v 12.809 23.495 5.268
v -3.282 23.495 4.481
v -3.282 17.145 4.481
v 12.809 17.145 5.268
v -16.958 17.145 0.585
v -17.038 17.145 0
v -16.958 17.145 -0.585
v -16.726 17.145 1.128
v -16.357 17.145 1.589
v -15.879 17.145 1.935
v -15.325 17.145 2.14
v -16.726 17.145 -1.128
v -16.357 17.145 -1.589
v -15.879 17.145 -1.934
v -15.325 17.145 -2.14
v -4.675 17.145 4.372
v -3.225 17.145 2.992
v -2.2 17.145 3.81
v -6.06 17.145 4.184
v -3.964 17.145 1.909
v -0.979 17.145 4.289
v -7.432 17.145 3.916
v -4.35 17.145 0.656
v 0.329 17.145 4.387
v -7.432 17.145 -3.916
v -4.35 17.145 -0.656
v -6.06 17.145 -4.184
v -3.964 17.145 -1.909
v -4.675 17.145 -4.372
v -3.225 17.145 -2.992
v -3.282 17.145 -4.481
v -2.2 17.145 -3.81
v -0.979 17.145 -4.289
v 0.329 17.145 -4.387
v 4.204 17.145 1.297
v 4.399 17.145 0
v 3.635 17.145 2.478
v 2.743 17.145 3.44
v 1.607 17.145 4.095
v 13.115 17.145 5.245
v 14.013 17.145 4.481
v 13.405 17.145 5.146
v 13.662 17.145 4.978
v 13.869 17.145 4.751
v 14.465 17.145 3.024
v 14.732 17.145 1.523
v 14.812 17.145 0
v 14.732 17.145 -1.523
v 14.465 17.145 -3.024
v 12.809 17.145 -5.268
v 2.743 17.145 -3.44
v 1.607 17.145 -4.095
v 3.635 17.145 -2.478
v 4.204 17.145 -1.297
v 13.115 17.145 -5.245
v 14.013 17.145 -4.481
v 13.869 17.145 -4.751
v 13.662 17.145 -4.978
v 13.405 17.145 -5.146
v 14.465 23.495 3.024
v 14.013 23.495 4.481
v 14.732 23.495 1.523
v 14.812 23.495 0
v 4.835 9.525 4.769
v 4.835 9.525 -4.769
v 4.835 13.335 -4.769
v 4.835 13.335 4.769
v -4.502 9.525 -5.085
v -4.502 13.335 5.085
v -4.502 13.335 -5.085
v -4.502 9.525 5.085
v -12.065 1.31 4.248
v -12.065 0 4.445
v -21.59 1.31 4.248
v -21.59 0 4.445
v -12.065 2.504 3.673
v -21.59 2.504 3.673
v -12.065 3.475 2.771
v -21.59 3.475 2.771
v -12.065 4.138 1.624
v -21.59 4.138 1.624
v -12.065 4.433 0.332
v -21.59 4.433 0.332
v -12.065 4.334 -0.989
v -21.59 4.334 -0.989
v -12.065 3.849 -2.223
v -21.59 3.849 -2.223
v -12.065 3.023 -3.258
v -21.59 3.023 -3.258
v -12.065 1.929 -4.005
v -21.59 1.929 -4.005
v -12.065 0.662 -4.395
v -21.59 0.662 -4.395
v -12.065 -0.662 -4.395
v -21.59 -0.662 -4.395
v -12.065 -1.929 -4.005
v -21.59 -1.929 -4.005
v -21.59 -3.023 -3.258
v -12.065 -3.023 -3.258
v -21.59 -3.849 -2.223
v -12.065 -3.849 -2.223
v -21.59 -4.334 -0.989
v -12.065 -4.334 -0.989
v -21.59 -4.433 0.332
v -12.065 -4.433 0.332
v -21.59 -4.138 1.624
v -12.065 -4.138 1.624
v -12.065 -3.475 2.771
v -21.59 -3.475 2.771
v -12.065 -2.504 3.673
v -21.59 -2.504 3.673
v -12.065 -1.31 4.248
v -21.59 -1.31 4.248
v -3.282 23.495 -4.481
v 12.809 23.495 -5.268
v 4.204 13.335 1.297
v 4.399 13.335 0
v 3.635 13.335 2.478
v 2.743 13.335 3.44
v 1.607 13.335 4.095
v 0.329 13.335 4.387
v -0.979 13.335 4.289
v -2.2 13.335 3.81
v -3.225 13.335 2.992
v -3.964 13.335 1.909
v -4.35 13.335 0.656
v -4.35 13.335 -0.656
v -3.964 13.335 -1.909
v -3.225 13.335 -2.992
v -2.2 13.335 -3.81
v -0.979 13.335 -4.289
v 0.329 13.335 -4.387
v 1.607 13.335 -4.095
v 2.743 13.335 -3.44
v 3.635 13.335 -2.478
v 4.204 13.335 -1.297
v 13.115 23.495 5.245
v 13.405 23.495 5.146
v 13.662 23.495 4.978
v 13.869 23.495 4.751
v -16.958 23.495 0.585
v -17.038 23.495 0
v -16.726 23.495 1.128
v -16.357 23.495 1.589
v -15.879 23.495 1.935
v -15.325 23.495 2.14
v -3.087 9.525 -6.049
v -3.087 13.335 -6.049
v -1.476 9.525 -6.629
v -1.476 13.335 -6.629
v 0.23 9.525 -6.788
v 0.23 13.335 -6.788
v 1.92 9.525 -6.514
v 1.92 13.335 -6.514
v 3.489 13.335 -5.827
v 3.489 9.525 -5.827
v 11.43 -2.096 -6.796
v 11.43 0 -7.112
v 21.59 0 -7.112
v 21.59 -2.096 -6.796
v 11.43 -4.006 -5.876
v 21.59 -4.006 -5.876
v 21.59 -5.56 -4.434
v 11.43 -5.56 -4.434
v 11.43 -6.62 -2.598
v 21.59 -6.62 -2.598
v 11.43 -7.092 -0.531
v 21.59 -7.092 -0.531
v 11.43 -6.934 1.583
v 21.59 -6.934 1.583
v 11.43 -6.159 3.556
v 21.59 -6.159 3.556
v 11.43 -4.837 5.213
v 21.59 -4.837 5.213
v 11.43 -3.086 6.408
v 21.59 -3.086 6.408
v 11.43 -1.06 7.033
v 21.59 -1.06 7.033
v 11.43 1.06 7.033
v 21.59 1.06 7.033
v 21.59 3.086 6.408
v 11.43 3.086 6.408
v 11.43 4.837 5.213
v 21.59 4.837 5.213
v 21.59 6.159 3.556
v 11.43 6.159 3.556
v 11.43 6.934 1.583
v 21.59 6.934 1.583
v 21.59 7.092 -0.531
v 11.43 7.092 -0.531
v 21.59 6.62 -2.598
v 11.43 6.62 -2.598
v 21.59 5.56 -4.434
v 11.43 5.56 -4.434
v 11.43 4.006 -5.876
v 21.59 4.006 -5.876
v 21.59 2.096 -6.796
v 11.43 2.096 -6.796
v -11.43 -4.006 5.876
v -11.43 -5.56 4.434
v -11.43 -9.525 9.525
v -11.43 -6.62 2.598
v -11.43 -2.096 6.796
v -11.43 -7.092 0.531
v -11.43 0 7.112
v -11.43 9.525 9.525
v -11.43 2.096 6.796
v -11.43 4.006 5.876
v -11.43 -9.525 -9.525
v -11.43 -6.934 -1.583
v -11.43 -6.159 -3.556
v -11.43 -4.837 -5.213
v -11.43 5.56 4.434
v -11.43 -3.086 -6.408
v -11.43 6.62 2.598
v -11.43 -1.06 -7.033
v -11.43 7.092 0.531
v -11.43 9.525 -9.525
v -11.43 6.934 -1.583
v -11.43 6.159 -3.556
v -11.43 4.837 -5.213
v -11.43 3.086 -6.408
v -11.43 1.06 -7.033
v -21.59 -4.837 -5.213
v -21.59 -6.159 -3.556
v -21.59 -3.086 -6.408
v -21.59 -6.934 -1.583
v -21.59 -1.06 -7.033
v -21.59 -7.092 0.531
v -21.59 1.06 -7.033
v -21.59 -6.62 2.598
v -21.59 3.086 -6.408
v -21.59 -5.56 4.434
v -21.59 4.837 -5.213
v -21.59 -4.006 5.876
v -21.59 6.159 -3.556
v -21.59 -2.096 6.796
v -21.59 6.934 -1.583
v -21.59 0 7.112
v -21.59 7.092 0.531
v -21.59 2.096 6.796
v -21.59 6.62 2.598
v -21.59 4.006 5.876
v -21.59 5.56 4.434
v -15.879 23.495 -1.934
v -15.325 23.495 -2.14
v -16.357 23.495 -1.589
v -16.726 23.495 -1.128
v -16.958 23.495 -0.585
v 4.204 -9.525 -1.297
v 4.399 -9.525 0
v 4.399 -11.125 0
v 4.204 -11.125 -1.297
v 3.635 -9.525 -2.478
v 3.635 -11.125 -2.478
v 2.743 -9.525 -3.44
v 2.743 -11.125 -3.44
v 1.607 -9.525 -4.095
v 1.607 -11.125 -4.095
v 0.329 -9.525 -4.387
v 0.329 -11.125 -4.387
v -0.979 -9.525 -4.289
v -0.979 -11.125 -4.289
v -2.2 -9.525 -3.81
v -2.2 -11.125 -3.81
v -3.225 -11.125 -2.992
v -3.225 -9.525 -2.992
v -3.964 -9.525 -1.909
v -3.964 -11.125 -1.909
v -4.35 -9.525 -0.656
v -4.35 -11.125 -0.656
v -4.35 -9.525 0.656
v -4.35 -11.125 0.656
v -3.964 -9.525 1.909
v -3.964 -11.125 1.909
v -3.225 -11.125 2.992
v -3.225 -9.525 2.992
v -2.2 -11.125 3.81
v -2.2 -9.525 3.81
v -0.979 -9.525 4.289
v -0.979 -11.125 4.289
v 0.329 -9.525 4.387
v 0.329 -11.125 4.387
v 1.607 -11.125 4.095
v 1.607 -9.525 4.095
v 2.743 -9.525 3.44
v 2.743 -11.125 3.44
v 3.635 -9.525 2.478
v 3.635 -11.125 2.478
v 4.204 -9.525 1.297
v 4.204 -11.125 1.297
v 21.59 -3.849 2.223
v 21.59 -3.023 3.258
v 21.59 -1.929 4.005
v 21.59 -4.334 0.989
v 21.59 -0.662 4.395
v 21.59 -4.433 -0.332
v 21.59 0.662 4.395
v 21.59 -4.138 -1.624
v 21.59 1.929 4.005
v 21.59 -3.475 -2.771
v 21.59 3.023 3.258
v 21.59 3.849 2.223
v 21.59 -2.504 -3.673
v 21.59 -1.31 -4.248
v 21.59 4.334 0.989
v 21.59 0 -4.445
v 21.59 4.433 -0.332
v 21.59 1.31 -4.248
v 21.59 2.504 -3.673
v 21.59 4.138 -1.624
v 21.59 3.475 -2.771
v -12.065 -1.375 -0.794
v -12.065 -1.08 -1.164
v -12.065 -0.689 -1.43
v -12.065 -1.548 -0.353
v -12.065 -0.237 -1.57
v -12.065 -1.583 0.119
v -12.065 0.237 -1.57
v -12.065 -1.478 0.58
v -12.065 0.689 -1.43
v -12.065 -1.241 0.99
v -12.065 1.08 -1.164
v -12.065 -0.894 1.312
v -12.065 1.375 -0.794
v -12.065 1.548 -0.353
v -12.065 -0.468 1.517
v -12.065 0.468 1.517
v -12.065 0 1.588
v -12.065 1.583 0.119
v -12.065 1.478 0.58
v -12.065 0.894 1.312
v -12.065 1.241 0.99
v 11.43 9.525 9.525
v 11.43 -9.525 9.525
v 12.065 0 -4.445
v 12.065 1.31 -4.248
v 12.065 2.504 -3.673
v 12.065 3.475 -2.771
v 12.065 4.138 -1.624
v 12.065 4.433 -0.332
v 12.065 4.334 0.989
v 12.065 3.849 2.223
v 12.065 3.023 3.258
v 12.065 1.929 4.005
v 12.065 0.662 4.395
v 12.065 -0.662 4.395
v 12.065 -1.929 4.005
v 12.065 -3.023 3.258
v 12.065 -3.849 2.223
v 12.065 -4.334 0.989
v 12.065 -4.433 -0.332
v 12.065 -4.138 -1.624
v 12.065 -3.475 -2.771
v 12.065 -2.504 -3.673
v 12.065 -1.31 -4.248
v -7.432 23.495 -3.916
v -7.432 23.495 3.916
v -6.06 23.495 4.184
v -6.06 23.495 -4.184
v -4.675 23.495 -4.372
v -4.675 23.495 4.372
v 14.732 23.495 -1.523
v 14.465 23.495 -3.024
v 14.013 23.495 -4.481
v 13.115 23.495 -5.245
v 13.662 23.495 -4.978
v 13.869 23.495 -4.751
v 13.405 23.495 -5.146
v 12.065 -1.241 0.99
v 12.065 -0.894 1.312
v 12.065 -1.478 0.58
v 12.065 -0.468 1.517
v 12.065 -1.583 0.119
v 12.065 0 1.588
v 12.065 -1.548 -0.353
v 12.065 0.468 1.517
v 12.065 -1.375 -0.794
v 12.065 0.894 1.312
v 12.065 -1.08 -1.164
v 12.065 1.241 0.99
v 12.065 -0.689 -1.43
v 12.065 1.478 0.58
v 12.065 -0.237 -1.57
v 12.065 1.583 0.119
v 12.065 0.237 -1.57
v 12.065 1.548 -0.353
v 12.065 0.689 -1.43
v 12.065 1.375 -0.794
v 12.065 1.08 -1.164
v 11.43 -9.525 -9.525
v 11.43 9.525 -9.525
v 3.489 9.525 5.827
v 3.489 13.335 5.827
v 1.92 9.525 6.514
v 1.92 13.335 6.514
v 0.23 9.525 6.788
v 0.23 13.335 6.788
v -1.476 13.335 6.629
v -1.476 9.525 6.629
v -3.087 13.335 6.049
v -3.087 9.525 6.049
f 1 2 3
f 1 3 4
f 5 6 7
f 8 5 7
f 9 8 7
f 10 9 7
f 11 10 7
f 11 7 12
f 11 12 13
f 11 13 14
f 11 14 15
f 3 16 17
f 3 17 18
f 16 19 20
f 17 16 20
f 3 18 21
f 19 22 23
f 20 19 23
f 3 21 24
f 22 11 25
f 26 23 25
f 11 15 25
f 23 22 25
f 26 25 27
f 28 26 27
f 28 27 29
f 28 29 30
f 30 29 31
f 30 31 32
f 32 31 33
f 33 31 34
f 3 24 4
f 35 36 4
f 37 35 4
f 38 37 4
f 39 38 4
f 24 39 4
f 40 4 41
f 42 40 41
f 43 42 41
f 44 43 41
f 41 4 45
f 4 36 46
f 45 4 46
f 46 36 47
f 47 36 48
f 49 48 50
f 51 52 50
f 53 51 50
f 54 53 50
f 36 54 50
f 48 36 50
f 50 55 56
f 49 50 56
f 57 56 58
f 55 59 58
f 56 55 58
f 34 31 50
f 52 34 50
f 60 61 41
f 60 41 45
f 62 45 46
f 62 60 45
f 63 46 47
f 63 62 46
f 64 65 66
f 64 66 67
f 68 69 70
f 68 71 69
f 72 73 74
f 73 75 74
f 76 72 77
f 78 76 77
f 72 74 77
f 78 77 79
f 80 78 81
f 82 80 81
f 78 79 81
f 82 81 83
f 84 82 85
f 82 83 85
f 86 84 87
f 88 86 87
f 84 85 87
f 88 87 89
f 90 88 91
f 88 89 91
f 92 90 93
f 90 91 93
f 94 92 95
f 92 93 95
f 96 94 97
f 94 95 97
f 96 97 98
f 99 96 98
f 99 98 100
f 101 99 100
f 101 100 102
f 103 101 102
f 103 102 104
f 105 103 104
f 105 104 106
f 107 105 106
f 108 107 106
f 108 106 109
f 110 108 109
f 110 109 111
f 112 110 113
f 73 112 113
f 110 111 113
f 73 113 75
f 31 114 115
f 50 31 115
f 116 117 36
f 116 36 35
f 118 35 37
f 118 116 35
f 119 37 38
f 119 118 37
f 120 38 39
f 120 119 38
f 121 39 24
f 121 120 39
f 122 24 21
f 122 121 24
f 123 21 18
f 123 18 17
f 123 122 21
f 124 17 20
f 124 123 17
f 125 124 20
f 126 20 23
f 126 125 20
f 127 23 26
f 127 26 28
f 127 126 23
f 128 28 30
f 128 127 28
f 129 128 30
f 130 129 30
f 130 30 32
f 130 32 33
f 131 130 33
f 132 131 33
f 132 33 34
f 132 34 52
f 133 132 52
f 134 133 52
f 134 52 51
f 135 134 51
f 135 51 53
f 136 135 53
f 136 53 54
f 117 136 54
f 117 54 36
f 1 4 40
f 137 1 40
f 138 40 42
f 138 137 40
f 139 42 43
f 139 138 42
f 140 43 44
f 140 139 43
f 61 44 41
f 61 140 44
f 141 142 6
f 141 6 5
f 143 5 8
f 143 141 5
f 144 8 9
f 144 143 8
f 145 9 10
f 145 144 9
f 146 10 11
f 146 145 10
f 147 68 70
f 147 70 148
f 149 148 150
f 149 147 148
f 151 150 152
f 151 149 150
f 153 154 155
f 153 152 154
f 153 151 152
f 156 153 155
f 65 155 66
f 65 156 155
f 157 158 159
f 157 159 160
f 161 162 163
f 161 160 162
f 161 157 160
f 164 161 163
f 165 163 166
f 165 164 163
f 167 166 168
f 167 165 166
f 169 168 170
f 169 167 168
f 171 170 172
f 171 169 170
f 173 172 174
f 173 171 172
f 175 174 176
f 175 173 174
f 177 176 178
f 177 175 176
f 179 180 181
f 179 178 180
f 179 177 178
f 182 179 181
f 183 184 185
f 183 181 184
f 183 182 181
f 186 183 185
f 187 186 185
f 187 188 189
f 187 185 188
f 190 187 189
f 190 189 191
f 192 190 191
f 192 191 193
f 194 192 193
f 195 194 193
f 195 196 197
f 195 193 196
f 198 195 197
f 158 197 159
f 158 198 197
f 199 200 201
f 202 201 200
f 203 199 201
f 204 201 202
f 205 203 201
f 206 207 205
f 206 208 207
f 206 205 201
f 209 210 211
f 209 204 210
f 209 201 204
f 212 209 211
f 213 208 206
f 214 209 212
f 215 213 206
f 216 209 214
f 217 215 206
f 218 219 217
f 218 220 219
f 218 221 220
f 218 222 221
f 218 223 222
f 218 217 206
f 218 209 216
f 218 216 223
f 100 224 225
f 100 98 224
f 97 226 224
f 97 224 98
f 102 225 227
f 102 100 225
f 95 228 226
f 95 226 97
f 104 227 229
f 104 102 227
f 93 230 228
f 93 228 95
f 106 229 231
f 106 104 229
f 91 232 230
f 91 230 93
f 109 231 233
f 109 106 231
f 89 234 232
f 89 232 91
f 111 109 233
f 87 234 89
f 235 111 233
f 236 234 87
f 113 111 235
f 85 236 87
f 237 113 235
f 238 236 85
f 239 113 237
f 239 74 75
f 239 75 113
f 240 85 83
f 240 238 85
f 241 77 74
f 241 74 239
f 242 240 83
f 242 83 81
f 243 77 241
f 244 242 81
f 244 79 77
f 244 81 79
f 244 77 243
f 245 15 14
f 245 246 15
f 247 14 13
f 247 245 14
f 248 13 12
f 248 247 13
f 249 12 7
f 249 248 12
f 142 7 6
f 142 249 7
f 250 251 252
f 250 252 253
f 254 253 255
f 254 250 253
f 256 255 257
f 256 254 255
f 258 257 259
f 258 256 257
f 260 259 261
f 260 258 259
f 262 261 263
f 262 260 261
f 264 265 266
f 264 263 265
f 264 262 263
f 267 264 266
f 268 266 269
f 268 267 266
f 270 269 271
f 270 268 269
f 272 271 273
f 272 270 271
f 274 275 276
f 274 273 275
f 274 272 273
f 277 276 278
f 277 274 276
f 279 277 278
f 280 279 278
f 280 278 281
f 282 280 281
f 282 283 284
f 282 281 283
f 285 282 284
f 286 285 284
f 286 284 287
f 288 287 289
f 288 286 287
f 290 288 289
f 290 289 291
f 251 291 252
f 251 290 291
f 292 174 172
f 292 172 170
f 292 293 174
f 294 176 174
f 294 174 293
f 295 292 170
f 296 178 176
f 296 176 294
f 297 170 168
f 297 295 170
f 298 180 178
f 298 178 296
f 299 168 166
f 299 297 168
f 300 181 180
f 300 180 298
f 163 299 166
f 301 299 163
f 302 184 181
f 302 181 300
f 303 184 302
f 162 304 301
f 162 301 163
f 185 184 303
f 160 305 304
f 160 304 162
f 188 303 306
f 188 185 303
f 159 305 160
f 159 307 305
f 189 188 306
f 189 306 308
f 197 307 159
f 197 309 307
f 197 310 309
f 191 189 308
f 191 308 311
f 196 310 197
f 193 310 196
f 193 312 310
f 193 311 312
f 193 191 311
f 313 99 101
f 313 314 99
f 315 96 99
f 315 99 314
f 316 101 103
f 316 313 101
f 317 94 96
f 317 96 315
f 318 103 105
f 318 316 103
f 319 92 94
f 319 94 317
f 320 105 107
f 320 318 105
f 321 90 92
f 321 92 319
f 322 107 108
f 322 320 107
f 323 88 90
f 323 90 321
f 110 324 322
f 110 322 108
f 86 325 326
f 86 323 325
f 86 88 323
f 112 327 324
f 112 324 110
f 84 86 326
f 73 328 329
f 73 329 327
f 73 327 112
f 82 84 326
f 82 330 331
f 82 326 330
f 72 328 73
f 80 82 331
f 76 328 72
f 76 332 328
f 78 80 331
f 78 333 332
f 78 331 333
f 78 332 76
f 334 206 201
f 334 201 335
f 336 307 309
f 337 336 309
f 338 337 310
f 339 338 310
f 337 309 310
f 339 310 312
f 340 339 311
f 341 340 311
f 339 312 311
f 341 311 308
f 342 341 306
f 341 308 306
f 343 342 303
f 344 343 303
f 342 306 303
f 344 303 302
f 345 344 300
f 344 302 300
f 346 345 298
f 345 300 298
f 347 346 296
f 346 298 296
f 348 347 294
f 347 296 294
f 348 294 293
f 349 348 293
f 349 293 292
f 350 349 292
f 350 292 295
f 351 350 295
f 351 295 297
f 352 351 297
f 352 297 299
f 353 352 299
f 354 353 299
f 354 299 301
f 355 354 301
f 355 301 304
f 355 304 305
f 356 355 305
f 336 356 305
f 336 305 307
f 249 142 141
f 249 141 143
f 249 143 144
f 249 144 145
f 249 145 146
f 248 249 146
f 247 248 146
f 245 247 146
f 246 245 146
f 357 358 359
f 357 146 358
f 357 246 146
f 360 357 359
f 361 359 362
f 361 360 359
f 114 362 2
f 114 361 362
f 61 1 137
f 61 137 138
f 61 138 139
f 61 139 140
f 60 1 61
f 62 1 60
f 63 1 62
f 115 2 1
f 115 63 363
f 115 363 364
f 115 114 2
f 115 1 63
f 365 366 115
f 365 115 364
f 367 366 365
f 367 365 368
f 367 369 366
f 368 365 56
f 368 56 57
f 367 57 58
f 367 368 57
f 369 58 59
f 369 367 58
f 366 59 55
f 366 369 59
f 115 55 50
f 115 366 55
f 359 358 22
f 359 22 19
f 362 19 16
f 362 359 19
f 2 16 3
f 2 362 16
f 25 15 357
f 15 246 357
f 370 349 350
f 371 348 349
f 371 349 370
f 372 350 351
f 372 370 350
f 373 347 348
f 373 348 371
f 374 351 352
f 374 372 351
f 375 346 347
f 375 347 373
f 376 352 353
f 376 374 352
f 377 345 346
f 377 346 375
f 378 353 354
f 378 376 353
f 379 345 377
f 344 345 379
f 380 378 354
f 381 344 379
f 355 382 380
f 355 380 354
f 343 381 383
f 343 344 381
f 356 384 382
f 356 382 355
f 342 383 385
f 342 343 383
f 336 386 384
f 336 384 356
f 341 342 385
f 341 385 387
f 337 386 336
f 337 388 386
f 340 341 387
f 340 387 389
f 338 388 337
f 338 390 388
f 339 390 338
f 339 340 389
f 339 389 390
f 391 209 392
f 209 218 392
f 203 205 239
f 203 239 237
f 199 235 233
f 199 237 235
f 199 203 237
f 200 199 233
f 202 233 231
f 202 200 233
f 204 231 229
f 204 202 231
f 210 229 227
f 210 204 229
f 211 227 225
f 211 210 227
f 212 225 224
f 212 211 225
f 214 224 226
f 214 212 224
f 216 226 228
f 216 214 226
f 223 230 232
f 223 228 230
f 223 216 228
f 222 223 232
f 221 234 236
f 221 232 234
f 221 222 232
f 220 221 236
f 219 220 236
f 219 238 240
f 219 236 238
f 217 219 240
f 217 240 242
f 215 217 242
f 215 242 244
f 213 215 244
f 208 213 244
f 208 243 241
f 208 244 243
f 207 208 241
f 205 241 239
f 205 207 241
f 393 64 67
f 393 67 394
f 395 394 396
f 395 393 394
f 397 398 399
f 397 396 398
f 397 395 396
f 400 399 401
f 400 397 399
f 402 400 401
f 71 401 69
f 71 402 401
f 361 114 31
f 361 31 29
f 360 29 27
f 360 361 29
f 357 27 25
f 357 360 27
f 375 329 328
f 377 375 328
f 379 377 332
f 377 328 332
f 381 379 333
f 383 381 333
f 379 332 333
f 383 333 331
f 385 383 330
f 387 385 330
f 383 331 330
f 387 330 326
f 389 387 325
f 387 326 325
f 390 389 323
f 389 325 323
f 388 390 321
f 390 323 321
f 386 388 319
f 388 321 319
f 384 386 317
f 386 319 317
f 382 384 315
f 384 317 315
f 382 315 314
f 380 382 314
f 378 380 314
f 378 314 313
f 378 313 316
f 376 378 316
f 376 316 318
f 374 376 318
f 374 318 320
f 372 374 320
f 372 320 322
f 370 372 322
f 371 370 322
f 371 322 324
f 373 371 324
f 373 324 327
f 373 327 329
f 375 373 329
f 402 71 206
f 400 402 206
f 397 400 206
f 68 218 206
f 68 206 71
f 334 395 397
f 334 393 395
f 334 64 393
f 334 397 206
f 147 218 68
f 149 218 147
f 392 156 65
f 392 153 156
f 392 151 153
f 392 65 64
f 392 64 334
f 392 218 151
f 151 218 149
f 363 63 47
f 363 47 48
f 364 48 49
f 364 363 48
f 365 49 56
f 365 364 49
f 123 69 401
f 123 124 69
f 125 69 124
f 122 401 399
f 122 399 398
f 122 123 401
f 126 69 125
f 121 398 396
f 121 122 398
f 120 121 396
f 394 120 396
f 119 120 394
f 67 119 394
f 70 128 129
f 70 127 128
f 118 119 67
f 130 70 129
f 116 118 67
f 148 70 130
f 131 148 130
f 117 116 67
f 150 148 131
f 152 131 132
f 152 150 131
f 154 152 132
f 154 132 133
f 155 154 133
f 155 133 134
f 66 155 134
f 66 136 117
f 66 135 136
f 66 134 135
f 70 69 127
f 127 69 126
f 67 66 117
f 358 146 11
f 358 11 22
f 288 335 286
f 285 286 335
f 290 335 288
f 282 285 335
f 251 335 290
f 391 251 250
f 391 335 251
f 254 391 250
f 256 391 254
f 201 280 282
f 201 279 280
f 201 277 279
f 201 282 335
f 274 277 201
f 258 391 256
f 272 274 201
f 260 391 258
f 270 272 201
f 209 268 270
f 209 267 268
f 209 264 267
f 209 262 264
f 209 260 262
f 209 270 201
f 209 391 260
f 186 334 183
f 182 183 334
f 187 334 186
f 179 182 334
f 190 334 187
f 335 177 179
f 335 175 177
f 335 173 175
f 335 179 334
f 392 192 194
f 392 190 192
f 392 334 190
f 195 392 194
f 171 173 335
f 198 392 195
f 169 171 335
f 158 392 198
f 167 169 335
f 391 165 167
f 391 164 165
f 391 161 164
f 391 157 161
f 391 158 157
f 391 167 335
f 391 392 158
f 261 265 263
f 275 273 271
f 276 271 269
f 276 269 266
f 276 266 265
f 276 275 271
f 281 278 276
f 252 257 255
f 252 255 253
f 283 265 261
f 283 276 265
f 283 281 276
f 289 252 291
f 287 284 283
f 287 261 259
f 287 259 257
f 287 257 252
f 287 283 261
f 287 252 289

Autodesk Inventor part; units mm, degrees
ref_plane "YZ Plane" through (0, 0, 0) normal (1, 0, 0) x (0, 1, 0)
ref_plane "XZ Plane" through (0, 0, 0) normal (0, 1, 0) x (-1, 0, 0)
ref_plane "XY Plane" through (0, 0, 0) normal (0, 0, 1) x (1, 0, 0)
sketch "Sketch1" plane through (0, 0, 0) normal (0, 0, 1) x (1, 0, 0)
  line L0 (-11.43, 9.525) -> (11.43, 9.525)
  line L1 (11.43, 9.525) -> (11.43, -9.525)
  line L2 (11.43, -9.525) -> (-11.43, -9.525)
  line L3 (-11.43, -9.525) -> (-11.43, 9.525)
  point P0 (0, 0)
  point P1 (-11.43, 0)
  point P2 (0, 9.525)
  dimension "d0" = 19.05
  dimension "d1" = 22.86
extrude "Extrusion1" add sketch "Sketch1" along normal mid plane 19.05
sketch "Sketch2" plane through (-11.43, -9.525, 9.525) normal (-1, 0, 0) x (0, 0, 1)
  line L0 (0, 0) -> (0, 19.05) projected
  line L1 (-19.05, 19.05) -> (0, 19.05) projected
  line L2 (-19.05, 19.05) -> (-19.05, 0) projected
  line L3 (0, 0) -> (-19.05, 0) projected
  circle A0 centre (-9.525, 9.525) radius 7.112
  point P0 (-9.525, 19.05)
  point P1 (-19.05, 9.525)
  dimension "d4" = 14.224
extrude "Extrusion2" add sketch "Sketch2" along normal blind 10.16 contours A0
sketch "Sketch3" plane through (11.43, -9.525, 9.525) normal (1, 0, 0) x (0, 0, -1)
  circle A0 centre (9.525, 9.525) radius 7.112
  line L0 (0, 19.05) -> (0, 0) projected
  line L1 (0, 0) -> (19.05, 0) projected
  line L2 (19.05, 0) -> (19.05, 19.05) projected
  line L3 (0, 19.05) -> (19.05, 19.05) projected
  point P0 (9.525, 19.05)
  point P1 (-19.05, 9.525)
  point P2 (0, 9.525)
  point P3 (9.525, 19.05)
  dimension "d7" = 14.224
extrude "Extrusion3" add sketch "Sketch3" along normal blind 10.16 contours A0
sketch "Sketch4" plane through (-11.43, 9.525, 9.525) normal (0, 1, 0) x (1, 0, 0)
  line L0 (0, 0) -> (22.86, 0) projected
  line L1 (22.86, 0) -> (22.86, 19.05) projected
  line L2 (22.86, 19.05) -> (0, 19.05) projected
  line L3 (0, 19.05) -> (0, 0) projected
  line L4 (16.2654, 14.294) -> (16.2654, 4.756)
  line L5 (6.928, 4.44) -> (6.928, 14.61)
  arc A0 (6.928, 4.44) -> (16.2654, 4.756) centre (11.43, 9.525) ccw
  arc A1 (16.2654, 14.294) -> (6.928, 14.61) centre (11.43, 9.525) ccw
  point P0 (11.43, 19.05)
  point P1 (0, 9.525)
extrude "Extrusion4" add sketch "Sketch4" along normal blind 3.81 contours L4 A0 L5 A1
sketch "Sketch5" plane through (-11.43, 13.335, 9.525) normal (0, 1, 0) x (1, 0, 0)
  arc A0 (6.928, 4.44) -> (16.2654, 4.756) centre (11.43, 9.525) ccw projected
  line L0 (16.2654, 14.294) -> (16.2654, 4.756) projected
  arc A1 (16.2654, 14.294) -> (6.928, 14.61) centre (11.43, 9.525) ccw projected
  line L1 (6.928, 4.44) -> (6.928, 14.61) projected
  circle A2 centre (11.43, 9.525) radius 4.3993
extrude "Extrusion5" add sketch "Sketch5" along normal blind 10.16 contours A2
sketch "Sketch6" plane through (0, 23.495, 0) normal (0, 1, 0) x (1, 0, 0)
  circle A0 centre (0, 0) radius 4.3993 projected
  line L0 (0, 0) -> (16.7523, 0)
  line L1 (0, 0) -> (-17.0377, 0)
  arc A1 (-15.3253, 2.1404) -> (-17.0377, 0) centre (-14.8437, 0) ccw
  line L2 (-15.3253, 2.1404) -> (-7.4316, 3.9165)
  arc A2 (-3.282, 4.4806) -> (-7.4316, 3.9165) centre (-2.0931, -19.81) ccw
  line L3 (-3.282, 4.4806) -> (12.8089, 5.2681)
  arc A3 (14.0126, 4.4806) -> (12.8089, 5.2681) centre (12.8687, 4.0459) ccw
  arc A4 (14.8116, 0) -> (14.0126, 4.4806) centre (2.5491, 0.1246) ccw
  arc A5 (-17.0377, 0) -> (-15.3253, -2.1404) centre (-14.8437, 0) ccw
  line L4 (-15.3253, -2.1404) -> (-7.4316, -3.9165)
  arc A6 (-7.4316, -3.9165) -> (-3.282, -4.4806) centre (-2.0931, 19.81) ccw
  line L5 (-3.282, -4.4806) -> (12.8089, -5.2681)
  arc A7 (12.8089, -5.2681) -> (14.0126, -4.4806) centre (12.8687, -4.0459) ccw
  arc A8 (14.0126, -4.4806) -> (14.8116, 0) centre (2.5491, -0.1246) ccw
extrude "Extrusion6" add sketch "Sketch6" against normal blind 6.35
sketch "Sketch7" plane through (21.59, 0, 0) normal (1, 0, 0) x (0, 0, -1)
  circle A0 centre (0, 0) radius 4.445
  dimension "d16" = 8.89
extrude "Extrusion7" cut sketch "Sketch7" against normal blind 9.525
sketch "Sketch8" plane through (-21.59, 0, 0) normal (-1, 0, 0) x (0, 0, 1)
  circle A0 centre (0, 0) radius 4.445
  dimension "d19" = 8.89
extrude "Extrusion8" cut sketch "Sketch8" against normal blind 9.525
sketch "Sketch9" plane through (-12.065, 0, 0) normal (-1, 0, 0) x (0, 0, 1)
  circle A0 centre (0, 0) radius 1.5875
  dimension "d23" = 3.175
extrude "Extrusion9" cut sketch "Sketch9" against normal blind 71.4502
thread "Thread1" size "3/8-16 UNC" class "1B" standard "ANSI Unified Screw Threads" full length
thread "Thread2" size "3/8-16 UNC" class "1B" standard "ANSI Unified Screw Threads" full length
sketch "Sketch10" plane through (-11.43, -9.525, 9.525) normal (0, -1, 0) x (1, 0, 0)
  circle A0 centre (11.43, -9.525) radius 4.3993 projected
extrude "Extrusion10" add sketch "Sketch10" along normal blind 1.6002
properties part number "PV609-2"
